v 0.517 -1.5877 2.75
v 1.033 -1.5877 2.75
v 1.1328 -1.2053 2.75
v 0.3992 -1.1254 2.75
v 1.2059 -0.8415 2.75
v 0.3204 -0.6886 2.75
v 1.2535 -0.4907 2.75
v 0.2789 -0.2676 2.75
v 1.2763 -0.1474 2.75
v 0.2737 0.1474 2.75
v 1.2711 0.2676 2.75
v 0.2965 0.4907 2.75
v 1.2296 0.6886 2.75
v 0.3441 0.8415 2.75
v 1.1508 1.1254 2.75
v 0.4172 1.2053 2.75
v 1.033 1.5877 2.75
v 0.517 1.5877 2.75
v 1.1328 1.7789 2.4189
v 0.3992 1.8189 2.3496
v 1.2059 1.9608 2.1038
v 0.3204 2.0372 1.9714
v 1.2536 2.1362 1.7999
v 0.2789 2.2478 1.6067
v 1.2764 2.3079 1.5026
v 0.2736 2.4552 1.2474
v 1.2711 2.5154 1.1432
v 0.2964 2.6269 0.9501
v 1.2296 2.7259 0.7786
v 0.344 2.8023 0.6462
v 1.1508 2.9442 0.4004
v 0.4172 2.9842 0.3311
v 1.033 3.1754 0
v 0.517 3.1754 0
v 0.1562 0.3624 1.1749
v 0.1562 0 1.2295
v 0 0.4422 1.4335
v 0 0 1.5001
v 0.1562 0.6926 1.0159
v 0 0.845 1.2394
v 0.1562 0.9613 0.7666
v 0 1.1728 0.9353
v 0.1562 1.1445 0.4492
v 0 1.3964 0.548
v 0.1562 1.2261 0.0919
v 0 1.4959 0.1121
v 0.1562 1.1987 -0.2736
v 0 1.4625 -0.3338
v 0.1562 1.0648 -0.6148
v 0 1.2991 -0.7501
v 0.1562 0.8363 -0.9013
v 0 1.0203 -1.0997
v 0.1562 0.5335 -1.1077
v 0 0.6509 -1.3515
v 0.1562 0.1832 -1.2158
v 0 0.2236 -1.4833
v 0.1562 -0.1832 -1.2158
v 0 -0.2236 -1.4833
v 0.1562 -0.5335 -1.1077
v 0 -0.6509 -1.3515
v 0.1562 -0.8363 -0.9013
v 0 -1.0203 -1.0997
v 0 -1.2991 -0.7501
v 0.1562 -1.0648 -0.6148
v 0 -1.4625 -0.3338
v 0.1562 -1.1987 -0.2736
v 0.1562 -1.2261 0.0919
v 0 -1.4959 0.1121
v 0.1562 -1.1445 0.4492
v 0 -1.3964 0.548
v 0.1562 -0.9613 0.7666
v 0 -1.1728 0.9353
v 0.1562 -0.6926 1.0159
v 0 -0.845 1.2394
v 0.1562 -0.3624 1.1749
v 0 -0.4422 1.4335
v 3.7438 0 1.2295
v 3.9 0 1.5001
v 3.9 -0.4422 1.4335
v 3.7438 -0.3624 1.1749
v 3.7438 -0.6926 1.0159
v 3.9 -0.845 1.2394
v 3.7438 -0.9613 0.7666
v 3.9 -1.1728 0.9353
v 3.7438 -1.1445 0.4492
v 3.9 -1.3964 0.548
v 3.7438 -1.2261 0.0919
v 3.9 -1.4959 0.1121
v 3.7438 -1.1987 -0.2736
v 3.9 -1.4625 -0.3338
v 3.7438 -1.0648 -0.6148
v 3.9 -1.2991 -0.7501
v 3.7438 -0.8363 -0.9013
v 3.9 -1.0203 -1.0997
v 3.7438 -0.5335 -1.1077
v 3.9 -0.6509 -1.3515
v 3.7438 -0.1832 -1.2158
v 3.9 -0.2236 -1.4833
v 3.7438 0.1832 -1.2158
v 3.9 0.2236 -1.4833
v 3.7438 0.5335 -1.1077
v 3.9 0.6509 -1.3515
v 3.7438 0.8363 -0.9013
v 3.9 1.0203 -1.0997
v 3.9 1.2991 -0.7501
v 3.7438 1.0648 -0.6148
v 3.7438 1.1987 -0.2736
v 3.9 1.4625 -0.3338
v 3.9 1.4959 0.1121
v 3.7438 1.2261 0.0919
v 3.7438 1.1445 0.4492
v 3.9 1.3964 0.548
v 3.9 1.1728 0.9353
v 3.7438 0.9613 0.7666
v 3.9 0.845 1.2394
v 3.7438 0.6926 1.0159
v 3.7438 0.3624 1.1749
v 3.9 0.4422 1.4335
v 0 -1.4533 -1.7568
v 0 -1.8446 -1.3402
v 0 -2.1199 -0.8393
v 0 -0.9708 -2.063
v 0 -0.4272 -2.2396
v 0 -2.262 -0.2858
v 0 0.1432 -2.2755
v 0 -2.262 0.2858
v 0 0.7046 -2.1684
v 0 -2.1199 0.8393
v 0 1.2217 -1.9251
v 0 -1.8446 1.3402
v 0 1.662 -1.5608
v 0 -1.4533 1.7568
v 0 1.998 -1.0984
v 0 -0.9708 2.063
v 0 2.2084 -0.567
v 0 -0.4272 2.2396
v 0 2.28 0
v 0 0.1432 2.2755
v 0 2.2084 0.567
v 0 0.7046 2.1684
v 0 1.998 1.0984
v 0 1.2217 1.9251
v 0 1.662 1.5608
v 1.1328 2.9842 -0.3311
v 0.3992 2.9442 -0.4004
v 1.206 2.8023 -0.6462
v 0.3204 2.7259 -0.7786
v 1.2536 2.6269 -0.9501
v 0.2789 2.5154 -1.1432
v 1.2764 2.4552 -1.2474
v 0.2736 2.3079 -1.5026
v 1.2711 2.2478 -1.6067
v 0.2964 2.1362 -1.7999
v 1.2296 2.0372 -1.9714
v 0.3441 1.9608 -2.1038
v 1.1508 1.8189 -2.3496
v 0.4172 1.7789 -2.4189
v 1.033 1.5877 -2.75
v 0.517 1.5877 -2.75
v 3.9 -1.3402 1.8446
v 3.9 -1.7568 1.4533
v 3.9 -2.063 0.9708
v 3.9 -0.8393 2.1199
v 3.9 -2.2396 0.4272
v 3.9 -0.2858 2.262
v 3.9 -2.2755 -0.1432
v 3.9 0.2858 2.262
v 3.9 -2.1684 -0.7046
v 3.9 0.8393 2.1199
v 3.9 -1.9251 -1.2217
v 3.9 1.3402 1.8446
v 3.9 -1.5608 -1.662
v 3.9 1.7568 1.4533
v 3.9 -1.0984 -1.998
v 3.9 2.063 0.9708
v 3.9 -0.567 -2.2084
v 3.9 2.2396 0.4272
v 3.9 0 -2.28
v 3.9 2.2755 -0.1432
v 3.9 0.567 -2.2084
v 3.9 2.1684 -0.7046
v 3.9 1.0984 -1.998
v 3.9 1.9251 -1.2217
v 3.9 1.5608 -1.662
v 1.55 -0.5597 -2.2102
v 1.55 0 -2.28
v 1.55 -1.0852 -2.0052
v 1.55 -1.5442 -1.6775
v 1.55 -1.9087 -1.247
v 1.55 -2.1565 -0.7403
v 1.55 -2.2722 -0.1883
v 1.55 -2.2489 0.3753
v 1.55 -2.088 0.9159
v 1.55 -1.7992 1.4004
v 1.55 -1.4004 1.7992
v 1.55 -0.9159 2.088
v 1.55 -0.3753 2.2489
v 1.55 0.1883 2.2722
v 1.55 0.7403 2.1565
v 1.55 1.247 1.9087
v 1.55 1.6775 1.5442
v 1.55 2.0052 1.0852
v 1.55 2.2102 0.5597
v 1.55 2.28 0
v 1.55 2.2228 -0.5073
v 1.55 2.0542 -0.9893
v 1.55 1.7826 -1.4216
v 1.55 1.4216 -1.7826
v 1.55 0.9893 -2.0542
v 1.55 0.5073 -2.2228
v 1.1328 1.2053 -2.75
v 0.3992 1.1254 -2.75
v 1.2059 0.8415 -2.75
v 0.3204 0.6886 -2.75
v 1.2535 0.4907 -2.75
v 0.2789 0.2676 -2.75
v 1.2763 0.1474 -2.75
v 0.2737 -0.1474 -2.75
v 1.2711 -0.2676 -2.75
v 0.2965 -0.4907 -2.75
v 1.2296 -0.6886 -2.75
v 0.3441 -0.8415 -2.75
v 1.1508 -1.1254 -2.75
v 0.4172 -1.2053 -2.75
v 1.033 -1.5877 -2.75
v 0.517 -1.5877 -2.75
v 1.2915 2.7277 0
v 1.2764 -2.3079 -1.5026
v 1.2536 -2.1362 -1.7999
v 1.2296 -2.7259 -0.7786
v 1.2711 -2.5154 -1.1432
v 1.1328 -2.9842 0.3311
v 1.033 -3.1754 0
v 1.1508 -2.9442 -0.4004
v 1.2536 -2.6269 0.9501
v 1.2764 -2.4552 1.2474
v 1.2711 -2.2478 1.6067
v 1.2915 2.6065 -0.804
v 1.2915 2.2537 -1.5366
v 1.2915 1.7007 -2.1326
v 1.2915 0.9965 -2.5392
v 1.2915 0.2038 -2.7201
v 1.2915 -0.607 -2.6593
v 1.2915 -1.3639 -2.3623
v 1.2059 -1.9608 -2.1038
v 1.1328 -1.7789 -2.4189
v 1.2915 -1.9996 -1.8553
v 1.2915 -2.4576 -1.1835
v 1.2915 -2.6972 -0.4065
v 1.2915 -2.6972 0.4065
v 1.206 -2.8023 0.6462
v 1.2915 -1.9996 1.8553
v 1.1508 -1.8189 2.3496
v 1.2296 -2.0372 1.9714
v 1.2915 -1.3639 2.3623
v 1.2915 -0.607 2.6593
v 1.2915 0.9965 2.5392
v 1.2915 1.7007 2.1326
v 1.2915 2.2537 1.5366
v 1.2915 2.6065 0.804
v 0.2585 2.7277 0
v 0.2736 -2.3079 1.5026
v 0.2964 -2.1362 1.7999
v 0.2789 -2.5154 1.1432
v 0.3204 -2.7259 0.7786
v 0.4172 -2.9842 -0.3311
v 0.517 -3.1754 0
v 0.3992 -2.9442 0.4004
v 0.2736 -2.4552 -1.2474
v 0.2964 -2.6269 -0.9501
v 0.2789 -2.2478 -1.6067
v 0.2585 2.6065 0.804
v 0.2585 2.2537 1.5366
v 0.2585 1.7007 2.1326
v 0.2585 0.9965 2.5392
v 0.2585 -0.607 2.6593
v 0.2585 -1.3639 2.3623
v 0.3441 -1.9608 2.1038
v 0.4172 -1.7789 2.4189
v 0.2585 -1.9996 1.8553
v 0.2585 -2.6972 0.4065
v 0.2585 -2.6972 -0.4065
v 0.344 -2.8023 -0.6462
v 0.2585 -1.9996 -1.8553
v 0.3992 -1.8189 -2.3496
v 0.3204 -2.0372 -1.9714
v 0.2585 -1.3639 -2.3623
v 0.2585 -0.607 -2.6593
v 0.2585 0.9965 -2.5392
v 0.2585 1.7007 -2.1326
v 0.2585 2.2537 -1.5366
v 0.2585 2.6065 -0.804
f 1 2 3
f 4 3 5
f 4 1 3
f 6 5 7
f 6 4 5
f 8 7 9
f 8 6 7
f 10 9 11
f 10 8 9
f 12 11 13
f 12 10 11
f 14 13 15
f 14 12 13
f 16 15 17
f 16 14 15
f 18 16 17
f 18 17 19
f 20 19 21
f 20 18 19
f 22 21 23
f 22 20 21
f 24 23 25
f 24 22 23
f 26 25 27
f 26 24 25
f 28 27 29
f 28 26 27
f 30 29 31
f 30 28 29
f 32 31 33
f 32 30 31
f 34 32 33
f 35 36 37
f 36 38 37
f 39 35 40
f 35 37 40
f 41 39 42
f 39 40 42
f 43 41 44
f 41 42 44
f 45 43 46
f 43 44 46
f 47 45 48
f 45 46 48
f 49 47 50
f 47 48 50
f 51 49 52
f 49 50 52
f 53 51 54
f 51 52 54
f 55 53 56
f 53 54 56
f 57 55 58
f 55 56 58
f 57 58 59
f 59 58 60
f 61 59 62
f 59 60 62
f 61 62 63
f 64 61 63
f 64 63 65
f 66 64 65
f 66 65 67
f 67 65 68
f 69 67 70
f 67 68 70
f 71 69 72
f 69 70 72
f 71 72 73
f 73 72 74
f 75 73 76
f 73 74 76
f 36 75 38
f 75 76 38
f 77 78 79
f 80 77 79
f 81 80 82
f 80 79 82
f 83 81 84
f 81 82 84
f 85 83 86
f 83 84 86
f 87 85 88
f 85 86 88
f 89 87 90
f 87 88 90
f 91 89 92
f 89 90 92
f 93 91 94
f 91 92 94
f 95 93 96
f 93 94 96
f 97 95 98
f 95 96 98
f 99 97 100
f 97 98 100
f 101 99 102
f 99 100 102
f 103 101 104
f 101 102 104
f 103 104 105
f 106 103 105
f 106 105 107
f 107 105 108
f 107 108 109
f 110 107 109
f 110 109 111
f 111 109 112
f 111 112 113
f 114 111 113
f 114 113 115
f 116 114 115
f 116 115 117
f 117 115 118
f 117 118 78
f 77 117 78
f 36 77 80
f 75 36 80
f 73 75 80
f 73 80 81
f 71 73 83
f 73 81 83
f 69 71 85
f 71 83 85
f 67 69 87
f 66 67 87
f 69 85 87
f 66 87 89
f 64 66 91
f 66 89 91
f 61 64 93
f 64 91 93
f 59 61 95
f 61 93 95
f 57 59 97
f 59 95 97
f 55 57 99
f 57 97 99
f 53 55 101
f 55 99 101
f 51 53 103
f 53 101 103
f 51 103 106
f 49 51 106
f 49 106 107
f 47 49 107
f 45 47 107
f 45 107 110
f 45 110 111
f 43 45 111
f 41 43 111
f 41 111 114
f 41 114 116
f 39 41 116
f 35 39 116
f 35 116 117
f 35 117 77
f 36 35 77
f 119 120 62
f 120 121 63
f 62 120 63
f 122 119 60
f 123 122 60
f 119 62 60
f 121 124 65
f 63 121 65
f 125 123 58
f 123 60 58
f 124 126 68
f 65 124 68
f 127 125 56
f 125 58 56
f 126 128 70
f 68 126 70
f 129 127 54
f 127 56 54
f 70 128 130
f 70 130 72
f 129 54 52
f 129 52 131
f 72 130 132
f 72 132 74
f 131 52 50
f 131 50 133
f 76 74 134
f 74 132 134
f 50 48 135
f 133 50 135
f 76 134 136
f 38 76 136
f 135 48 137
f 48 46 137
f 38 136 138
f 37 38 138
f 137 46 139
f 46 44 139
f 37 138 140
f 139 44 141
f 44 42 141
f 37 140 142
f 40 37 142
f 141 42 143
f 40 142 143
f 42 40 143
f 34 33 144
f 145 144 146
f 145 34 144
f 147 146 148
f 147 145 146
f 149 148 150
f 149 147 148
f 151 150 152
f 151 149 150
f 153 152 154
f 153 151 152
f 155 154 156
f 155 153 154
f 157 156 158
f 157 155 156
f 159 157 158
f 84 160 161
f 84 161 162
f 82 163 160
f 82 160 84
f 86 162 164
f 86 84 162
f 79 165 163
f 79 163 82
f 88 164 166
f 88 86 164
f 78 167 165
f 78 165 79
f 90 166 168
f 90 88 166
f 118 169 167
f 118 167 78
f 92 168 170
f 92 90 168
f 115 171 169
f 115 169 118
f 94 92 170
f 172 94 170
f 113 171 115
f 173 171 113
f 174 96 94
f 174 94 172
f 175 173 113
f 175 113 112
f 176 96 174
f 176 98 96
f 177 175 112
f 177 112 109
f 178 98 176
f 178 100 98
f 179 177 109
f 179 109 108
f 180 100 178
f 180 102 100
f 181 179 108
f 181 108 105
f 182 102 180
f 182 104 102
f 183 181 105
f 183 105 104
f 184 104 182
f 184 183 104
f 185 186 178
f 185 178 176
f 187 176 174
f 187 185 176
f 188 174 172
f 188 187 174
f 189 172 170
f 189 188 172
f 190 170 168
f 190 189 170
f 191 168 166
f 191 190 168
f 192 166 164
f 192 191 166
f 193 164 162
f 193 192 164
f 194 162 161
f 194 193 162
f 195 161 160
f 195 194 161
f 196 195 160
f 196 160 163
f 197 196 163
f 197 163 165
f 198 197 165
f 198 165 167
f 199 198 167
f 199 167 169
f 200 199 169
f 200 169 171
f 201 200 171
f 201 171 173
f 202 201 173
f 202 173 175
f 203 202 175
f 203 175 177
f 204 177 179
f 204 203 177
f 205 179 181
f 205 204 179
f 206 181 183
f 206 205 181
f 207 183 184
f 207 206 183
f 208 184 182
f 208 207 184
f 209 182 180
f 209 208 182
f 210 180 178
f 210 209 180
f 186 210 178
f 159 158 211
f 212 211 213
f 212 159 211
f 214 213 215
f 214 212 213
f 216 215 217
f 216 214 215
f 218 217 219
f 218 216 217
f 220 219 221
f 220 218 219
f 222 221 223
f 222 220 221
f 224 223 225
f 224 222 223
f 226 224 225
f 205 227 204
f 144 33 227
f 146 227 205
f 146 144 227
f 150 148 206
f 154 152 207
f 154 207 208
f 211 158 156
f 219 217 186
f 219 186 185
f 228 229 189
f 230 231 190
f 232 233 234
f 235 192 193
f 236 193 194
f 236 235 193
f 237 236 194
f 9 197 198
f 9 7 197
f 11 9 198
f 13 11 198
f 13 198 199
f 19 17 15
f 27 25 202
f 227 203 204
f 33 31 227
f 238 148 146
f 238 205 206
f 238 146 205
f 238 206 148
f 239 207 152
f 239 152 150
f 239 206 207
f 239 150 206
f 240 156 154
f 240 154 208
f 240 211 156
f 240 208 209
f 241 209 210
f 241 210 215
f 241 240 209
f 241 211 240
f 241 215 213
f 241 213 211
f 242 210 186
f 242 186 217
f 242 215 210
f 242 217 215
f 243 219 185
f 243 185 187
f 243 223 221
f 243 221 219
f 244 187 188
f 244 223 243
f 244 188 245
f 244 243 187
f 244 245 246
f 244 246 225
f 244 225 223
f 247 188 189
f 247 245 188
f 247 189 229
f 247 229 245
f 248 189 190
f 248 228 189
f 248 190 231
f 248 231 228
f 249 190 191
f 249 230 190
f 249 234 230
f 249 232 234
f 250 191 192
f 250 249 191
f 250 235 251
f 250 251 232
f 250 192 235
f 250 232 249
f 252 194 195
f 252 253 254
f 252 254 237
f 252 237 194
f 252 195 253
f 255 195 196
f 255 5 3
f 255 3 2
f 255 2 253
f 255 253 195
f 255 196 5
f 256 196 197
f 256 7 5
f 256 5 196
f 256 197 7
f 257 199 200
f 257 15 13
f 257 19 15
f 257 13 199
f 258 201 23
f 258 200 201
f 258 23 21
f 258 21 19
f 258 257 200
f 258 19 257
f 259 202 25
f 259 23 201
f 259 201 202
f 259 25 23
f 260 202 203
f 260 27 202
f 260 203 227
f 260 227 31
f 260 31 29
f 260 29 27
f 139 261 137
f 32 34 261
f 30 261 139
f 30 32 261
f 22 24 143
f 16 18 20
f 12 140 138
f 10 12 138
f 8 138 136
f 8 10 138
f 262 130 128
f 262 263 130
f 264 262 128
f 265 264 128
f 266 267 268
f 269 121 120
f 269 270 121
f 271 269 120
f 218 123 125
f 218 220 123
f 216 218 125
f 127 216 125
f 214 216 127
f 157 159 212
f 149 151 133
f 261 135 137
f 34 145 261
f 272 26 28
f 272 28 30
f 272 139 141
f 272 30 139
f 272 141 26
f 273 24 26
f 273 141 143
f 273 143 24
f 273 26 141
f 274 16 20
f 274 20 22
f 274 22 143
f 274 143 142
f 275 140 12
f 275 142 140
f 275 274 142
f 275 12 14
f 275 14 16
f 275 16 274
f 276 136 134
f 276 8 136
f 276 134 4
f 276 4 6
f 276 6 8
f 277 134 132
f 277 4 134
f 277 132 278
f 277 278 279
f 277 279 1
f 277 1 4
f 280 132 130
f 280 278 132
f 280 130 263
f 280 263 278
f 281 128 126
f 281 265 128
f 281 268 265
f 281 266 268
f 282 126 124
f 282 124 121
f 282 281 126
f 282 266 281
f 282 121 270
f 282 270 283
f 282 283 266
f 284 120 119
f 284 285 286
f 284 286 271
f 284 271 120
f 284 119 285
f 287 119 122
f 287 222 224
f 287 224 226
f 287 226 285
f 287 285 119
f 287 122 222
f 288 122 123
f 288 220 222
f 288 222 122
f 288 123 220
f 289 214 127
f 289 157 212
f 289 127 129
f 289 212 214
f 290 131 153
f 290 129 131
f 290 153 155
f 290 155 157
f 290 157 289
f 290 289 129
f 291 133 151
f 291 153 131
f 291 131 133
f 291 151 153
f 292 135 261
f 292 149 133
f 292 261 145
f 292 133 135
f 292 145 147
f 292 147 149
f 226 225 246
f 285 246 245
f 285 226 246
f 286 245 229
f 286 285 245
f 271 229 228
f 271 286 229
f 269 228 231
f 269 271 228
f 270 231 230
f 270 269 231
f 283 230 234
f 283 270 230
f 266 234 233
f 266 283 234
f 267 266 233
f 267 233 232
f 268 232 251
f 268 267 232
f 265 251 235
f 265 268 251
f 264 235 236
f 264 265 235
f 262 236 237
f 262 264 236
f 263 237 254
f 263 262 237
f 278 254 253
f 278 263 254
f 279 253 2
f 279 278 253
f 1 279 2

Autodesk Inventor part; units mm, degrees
ref_plane "YZ Plane" through (0, 0, 0) normal (1, 0, 0) x (0, 1, 0)
ref_plane "XZ Plane" through (0, 0, 0) normal (0, 1, 0) x (-1, 0, 0)
sketch "Skizze1" plane through (0, 0, 0) normal (1, 0, 0) x (0, 1, 0)
  line L0 (1.5877, -2.75) -> (-1.5877, -2.75)
  line L1 (-1.5877, -2.75) -> (-3.1754, 0)
  line L2 (-3.1754, 0) -> (-1.5877, 2.75)
  line L3 (-1.5877, 2.75) -> (1.5877, 2.75)
  line L4 (1.5877, 2.75) -> (3.1754, 0)
  line L5 (3.1754, 0) -> (1.5877, -2.75)
  point P0 (0, 0)
  point P1 (0, 0)
  dimension "d0" = 6.3509
extrude "Körper" add sketch "Skizze1" along normal blind 1.55
sketch "Skizze2" plane through (1.55, 0, 0) normal (1, 0, 0) x (0, 0, -1)
  circle A0 centre (0, 0) radius 2.28
  dimension "d7" = 4.56
extrude "Ring" add sketch "Skizze2" along normal blind 2.35
sketch "Skizze3" plane through (0, 0, 0) normal (0, 0, 1) x (1, 0, 0)
  line L0 (0, 1.5877) -> (0, 3.1754) projected
  line L1 (0, 3.1754) -> (1.55, 3.1754) projected
  line L2 (1.55, 1.5877) -> (1.55, 3.1754) projected
  line L3 (-0.31, 0) -> (1.86, 0) projected
  line L4 (0, 2.28) -> (0.517, 3.1754)
  line L5 (1.033, 3.1754) -> (1.55, 2.28)
  dimension "d3" = 30
  dimension "d4" = 30
  dimension "d5" = 4.56
  dimension "d6" = 4.56
revolve "Fase1" cut sketch "Skizze3" angle 360 about axis through (-10, 0, 0) along (1, 0, 0)
sketch "Skizze4" plane through (0, 0, 0) normal (-1, 0, 0) x (0, 0, 1)
  line L0 (0, -4.4456) -> (0, 4.4456) projected
  line L1 (-3.85, 0) -> (3.85, 0) projected
  point P0 (0, 0)
hole "Gewinde" at (0, 0, 0) direction (1, 0, 0) diameter 2.459 end through all thread size "M3x0.5" class "6H" standard "ISO Metric profile"
chamfer "Fase2" distance 0.2706 angle 30 1 edges at (0, 0, -1.2295) measured on face at (0, 1.9048, -0.2313)
chamfer "Fase3" distance 0.2706 angle 30 1 edges at (3.9, 0, -1.2295) measured on face at (3.9, -0.28, -1.8958)
ref_plane "Work Plane1" through (9.2625, 0, 0) normal (0, 0, 1) x (-1, 0, 0)
equation "\"d0\" = 1.1547 * SW"
equation "\"d1\" = KOH1"
equation "\"d7\" = SD2"
equation "\"d8\" = KOH - KOH1"
equation "\"d3\" = ANG1"
equation "\"d4\" = ANG2"
equation "\"d5\" = SW0"
equation "\"d6\" = SW01"
equation "\"d10\" = -0.5 * GD1 + 0.5 * NND"
equation "\"d46\" = -0.5 * GD1 + 0.5 * NND"
equation "\"d12\" = -0.5 * GD1 + 0.5 * NND"
equation "\"d47\" = -0.5 * GD1 + 0.5 * NND"
equation "\"ANG1\" = 30deg"
equation "\"ANG2\" = 30deg"
equation "\"NND\" = 3"
equation "\"KOH1\" = 1.55"
equation "\"KOH\" = 3.9"
equation "\"SW\" = 5.5"
equation "\"SW0\" = 4.56"
equation "\"SW01\" = SW0"
equation "\"SD2\" = SW0"
equation "\"GUL\" = 0.541266 * PTC"
equation "\"THREADDIA\" = 3"
equation "\"TOA\" = 30deg"
equation "\"PTC\" = 0.5"
equation "\"E0\" = 1.155 * SW"
equation "\"GAL\" = 0.541266 * PTC"
equation "\"GD1\" = 2.458734"
properties part number "ISO 10511 - M3" material "Stahl, weich"
